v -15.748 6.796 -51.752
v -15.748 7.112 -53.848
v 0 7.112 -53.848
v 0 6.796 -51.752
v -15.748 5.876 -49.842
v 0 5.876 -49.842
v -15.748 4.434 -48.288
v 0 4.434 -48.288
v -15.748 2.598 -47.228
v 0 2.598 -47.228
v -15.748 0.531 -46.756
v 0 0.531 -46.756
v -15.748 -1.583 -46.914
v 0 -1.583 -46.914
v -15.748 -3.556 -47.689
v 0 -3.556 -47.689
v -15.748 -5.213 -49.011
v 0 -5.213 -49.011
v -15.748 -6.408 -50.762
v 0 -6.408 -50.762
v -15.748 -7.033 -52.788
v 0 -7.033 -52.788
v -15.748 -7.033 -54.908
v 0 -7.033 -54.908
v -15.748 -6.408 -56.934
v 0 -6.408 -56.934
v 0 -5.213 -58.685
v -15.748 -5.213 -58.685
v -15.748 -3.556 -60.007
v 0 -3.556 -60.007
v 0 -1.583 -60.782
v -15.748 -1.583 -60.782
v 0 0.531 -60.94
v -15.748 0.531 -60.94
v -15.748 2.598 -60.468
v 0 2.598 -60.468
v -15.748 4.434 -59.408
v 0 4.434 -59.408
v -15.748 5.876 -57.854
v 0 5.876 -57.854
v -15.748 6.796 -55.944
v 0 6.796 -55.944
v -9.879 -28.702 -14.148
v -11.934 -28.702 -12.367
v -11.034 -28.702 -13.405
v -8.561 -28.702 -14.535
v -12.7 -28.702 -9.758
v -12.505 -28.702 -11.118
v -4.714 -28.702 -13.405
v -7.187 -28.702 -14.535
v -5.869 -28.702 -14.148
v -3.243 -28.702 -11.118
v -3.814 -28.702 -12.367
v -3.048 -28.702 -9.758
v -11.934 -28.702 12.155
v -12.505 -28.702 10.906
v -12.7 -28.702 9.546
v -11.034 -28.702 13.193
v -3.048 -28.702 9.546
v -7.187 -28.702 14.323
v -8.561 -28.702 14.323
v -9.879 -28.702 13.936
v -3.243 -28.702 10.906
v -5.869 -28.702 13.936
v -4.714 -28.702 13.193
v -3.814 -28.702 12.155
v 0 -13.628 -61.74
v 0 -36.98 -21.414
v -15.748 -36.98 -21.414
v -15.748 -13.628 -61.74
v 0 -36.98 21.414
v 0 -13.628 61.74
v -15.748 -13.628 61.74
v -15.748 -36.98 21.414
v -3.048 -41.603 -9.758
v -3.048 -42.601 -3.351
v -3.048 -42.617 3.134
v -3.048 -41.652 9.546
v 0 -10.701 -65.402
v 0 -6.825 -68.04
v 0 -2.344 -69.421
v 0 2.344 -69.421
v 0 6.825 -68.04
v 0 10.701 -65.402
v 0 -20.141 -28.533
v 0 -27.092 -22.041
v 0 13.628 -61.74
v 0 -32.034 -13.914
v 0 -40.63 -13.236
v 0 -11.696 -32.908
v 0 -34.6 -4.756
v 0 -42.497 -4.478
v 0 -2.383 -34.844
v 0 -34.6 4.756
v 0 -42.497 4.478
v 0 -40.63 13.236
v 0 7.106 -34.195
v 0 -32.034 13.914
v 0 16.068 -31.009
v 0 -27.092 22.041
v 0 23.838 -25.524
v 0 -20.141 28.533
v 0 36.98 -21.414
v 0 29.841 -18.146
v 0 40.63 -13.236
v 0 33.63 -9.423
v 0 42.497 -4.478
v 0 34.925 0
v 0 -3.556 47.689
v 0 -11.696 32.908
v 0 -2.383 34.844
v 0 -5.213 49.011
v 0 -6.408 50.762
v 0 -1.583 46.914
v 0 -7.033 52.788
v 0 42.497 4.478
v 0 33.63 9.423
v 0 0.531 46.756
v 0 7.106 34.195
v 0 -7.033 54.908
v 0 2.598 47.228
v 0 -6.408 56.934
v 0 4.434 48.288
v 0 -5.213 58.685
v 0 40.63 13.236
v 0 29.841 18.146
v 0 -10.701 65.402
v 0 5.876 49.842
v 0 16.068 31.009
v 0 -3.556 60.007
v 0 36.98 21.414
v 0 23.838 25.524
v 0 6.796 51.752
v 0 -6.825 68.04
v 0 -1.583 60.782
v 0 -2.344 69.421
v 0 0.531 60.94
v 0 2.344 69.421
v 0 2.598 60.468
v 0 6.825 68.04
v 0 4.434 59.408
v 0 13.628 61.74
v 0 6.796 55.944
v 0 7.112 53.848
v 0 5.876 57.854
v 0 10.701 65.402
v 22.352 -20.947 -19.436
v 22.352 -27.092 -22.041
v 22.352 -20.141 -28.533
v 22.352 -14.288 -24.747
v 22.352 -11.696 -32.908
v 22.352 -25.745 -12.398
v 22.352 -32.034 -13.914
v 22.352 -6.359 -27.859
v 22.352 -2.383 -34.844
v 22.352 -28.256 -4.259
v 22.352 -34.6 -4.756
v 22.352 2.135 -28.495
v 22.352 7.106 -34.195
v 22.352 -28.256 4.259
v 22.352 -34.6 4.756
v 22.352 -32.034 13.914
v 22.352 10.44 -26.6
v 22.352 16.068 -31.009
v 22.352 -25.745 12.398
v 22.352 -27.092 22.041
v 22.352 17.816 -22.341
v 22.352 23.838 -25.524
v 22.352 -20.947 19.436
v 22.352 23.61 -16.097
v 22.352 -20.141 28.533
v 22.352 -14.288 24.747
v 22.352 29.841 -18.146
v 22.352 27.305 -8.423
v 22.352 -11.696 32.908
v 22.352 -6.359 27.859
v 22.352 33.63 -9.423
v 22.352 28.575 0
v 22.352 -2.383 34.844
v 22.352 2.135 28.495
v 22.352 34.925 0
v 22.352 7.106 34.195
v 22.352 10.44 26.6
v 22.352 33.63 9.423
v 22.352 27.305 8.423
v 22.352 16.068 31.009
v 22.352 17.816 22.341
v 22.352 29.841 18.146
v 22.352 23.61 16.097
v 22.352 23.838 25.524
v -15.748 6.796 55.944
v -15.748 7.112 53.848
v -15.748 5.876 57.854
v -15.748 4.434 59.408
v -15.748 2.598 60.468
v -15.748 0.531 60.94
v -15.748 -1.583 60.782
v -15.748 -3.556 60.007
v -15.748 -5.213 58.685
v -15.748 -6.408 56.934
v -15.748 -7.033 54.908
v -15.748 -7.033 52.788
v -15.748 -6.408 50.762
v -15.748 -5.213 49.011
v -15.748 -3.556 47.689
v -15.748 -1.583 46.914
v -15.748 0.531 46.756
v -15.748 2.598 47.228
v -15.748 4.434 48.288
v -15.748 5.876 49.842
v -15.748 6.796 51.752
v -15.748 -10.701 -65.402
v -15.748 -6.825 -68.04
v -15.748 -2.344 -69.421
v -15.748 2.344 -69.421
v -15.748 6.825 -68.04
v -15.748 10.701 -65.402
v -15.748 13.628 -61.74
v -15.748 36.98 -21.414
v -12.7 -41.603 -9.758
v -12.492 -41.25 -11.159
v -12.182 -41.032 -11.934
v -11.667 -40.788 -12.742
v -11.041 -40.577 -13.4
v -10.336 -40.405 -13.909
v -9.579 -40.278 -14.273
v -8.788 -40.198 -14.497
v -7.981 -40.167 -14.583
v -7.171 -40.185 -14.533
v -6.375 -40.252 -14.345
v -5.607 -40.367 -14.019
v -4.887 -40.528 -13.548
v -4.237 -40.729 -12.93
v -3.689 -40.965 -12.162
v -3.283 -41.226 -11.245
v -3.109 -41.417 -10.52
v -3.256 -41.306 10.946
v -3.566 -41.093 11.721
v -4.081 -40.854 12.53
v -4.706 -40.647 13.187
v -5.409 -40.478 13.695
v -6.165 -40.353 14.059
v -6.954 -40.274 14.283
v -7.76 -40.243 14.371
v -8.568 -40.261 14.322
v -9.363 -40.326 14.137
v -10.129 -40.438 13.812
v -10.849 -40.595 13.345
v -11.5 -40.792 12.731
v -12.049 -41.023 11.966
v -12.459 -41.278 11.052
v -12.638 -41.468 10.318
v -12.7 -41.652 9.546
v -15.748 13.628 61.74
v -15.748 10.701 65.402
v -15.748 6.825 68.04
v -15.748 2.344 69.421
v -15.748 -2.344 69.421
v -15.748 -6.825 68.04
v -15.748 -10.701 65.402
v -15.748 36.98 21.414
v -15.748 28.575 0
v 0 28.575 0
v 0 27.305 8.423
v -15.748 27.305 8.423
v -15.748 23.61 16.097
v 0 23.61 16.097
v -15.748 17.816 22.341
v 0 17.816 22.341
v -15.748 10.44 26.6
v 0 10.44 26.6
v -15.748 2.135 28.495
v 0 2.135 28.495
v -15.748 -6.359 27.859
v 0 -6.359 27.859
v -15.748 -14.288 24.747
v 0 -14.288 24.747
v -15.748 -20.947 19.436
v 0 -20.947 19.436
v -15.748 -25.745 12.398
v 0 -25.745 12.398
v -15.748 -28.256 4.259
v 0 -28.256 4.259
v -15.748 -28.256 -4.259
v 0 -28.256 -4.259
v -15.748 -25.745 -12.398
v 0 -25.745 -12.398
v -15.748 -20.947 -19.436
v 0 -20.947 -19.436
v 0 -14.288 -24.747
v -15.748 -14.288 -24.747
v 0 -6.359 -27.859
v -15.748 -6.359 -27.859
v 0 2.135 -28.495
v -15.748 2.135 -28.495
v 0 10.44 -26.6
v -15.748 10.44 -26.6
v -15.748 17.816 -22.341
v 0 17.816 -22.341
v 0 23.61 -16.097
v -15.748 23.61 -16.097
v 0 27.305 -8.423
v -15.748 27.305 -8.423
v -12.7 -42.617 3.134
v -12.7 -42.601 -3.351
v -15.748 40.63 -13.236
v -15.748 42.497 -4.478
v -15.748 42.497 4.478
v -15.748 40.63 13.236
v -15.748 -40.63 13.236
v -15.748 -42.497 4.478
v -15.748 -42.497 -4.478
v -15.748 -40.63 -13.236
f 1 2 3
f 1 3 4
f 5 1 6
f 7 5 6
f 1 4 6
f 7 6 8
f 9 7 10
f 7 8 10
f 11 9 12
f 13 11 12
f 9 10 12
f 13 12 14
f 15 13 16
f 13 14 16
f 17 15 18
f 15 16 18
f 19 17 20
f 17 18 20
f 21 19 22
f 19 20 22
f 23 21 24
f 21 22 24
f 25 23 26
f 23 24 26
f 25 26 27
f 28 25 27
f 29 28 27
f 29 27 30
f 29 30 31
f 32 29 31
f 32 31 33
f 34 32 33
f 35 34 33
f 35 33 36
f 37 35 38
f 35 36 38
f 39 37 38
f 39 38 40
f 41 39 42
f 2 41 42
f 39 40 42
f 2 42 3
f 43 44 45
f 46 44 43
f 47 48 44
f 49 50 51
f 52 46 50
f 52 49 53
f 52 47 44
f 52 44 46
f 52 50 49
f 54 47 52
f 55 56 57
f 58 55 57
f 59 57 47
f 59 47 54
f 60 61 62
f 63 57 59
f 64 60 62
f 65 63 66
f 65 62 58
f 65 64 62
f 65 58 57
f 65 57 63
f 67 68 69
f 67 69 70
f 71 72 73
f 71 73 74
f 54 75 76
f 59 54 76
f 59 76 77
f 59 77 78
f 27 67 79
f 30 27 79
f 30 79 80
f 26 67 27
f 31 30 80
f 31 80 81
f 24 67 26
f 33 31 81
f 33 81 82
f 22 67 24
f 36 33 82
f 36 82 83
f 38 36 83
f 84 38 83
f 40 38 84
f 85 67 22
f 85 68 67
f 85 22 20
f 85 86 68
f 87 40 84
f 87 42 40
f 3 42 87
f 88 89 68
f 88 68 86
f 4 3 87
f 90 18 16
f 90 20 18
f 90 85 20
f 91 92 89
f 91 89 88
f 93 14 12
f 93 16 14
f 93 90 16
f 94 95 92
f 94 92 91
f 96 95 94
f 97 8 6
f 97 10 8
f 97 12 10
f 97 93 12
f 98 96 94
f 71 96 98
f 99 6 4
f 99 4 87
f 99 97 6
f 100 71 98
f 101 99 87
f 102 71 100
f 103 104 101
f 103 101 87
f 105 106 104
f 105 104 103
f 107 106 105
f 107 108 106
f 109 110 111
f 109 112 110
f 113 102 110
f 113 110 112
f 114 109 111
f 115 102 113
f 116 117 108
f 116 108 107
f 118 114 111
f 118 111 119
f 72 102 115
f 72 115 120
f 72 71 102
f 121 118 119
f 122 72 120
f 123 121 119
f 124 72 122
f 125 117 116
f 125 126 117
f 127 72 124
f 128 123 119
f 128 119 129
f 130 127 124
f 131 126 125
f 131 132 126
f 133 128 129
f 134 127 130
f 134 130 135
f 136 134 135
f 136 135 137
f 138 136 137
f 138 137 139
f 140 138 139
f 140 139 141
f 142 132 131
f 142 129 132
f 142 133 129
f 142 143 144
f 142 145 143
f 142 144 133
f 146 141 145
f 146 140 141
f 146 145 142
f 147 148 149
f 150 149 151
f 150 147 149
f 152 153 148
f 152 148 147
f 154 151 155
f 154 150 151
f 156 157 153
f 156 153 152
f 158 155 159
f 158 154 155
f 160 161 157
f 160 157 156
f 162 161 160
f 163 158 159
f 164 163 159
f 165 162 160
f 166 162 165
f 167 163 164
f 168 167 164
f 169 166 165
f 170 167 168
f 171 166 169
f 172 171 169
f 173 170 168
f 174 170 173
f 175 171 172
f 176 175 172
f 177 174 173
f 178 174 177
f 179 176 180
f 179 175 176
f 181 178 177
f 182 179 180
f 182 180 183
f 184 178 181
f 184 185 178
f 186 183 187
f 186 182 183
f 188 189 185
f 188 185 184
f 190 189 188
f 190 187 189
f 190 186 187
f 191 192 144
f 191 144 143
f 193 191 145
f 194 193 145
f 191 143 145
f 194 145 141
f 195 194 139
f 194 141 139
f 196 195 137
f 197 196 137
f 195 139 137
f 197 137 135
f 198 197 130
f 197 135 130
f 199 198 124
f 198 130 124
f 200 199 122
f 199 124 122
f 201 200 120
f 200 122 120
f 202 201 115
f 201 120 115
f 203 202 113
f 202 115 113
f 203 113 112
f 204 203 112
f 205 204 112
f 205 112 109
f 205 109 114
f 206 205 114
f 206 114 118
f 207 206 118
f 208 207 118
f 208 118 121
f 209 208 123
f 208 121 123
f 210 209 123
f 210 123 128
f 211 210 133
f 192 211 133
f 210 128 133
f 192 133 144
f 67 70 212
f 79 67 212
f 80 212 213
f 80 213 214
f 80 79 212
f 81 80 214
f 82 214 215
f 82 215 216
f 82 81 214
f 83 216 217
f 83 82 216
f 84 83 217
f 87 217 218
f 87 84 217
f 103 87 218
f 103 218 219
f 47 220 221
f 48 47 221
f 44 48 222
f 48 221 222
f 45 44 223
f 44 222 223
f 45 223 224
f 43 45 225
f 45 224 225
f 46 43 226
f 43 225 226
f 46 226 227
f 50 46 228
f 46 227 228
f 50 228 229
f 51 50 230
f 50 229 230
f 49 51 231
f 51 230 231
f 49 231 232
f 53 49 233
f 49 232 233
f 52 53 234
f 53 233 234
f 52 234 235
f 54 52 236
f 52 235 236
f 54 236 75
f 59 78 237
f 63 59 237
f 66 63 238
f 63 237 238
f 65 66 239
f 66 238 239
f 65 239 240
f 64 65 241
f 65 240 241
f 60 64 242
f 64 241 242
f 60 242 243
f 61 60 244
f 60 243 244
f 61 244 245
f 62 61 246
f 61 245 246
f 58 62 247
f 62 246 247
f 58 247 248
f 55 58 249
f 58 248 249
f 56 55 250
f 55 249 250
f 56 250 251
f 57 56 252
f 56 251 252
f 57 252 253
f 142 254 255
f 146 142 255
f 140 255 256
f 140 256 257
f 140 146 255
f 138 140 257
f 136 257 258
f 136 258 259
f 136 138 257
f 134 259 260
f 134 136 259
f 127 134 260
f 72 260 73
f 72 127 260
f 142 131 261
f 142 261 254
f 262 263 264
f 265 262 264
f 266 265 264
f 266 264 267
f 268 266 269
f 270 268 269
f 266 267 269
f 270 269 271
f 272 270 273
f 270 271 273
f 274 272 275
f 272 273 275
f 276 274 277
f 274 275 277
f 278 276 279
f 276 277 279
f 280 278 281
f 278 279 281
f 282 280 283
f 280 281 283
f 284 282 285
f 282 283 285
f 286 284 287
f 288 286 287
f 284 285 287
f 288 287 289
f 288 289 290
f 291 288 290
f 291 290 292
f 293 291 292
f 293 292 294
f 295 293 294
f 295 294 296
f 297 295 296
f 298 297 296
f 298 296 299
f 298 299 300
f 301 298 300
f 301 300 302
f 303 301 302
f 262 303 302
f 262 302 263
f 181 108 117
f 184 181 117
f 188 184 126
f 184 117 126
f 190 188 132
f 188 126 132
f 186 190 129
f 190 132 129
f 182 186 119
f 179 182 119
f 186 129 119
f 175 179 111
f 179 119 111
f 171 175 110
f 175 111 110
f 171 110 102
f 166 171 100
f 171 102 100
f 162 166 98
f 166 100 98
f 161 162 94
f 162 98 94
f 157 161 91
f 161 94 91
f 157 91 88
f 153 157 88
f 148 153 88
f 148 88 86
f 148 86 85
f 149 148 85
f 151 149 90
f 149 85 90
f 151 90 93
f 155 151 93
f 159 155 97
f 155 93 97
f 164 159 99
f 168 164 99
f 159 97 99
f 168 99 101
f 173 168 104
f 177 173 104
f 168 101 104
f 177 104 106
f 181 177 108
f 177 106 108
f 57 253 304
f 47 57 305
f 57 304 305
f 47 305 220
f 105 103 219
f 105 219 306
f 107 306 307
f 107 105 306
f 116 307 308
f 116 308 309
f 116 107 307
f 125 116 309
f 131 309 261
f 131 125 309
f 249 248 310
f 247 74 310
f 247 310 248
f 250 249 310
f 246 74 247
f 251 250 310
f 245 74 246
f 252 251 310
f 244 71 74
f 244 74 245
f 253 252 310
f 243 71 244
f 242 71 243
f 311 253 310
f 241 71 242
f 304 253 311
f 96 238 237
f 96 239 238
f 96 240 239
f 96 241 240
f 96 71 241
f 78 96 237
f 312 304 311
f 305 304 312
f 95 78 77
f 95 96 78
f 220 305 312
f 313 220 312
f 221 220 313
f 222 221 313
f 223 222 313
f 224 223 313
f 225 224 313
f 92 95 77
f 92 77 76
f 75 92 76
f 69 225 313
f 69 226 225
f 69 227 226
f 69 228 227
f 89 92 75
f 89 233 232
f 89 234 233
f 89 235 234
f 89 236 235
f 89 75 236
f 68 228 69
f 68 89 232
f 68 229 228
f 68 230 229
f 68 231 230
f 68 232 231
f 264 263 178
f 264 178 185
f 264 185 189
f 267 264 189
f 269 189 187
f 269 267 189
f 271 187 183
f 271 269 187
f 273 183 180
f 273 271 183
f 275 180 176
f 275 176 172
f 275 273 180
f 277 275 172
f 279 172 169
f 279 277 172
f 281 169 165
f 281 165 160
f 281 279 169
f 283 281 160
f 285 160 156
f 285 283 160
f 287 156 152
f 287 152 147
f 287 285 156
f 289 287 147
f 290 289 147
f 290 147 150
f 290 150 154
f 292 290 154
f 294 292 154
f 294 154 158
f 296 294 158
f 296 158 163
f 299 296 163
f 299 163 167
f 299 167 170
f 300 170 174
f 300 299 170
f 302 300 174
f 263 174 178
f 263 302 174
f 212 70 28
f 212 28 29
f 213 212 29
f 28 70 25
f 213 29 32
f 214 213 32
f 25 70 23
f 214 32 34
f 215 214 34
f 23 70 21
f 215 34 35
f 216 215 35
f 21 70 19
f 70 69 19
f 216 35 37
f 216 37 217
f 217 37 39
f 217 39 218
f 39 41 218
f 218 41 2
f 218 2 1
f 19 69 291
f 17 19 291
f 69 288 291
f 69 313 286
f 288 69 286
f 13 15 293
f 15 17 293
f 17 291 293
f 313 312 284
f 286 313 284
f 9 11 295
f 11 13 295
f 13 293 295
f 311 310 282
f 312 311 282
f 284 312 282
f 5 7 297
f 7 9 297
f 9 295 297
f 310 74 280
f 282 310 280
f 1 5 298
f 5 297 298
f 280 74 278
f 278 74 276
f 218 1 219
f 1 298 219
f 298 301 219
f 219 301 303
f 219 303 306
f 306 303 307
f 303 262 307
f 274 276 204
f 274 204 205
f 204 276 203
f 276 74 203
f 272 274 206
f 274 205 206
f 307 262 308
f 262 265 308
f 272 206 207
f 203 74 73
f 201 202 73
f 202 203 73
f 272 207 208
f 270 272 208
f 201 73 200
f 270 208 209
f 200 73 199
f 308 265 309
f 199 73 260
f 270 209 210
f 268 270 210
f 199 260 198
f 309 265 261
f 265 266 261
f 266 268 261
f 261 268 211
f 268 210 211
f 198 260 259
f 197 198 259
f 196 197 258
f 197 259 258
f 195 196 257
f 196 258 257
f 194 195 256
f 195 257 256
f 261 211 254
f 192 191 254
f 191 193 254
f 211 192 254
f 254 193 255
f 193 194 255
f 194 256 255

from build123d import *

# Parameters (mm, degrees)
F0_R     = 34.925
F0_R_2   = 28.575
F1_DEPTH = 22.352
F2_R     = 7.112
F3_DEPTH = 15.748
F6_DEPTH = 14.224
F7_R     = 28.575
F8_DEPTH = 15.749


with BuildPart() as f1:
    # F0 (on Right) → F1 (new body)
    with BuildSketch(Plane.YZ):
        Circle(F0_R)
        Circle(F0_R_2, mode=Mode.SUBTRACT)
    extrude(amount=F1_DEPTH)

    # F2 (on Right) → F3 (join)
    with BuildSketch(Plane.YZ):
        with BuildLine():
            ThreePointArc((36.979548, -21.413873), (42.7322, 0), (36.979548, 21.413873))
            Line((36.979548, 21.413873), (13.627988, 61.739606))
            ThreePointArc((13.627988, 61.739606), (0, 69.596), (-13.627988, 61.739606))
            Line((-13.627988, 61.739606), (-36.979548, 21.413873))
            ThreePointArc((-36.979548, 21.413873), (-42.7322, 0), (-36.979548, -21.413873))
            Line((-36.979548, -21.413873), (-13.627988, -61.739606))
            ThreePointArc((-13.627988, -61.739606), (0, -69.596), (13.627988, -61.739606))
            Line((13.627988, -61.739606), (36.979548, -21.413873))
        make_face()
        with Locations((0, -53.848)):
            Circle(F2_R, mode=Mode.SUBTRACT)
        with Locations((0, 53.848)):
            Circle(F2_R, mode=Mode.SUBTRACT)
    extrude(amount=-F3_DEPTH)

    # F5 (on offset) → F6 (cut)
    with BuildSketch(Plane.XZ.offset(42.926)):
        with BuildLine():
            Line((-12.7, 9.54586), (-12.7, -9.75814))
            ThreePointArc((-12.7, -9.75814), (-7.874, -14.58414), (-3.048, -9.75814))
            Line((-3.048, -9.75814), (-3.048, 9.54586))
            ThreePointArc((-3.048, 9.54586), (-7.874, 14.37186), (-12.7, 9.54586))
        make_face()
    extrude(amount=-F6_DEPTH, mode=Mode.SUBTRACT)

    # F7 (on face) → F8 (cut, through all)
    with BuildSketch(Plane.YZ):
        Circle(F7_R)
    extrude(amount=-F8_DEPTH, mode=Mode.SUBTRACT)


solid = f1.part
